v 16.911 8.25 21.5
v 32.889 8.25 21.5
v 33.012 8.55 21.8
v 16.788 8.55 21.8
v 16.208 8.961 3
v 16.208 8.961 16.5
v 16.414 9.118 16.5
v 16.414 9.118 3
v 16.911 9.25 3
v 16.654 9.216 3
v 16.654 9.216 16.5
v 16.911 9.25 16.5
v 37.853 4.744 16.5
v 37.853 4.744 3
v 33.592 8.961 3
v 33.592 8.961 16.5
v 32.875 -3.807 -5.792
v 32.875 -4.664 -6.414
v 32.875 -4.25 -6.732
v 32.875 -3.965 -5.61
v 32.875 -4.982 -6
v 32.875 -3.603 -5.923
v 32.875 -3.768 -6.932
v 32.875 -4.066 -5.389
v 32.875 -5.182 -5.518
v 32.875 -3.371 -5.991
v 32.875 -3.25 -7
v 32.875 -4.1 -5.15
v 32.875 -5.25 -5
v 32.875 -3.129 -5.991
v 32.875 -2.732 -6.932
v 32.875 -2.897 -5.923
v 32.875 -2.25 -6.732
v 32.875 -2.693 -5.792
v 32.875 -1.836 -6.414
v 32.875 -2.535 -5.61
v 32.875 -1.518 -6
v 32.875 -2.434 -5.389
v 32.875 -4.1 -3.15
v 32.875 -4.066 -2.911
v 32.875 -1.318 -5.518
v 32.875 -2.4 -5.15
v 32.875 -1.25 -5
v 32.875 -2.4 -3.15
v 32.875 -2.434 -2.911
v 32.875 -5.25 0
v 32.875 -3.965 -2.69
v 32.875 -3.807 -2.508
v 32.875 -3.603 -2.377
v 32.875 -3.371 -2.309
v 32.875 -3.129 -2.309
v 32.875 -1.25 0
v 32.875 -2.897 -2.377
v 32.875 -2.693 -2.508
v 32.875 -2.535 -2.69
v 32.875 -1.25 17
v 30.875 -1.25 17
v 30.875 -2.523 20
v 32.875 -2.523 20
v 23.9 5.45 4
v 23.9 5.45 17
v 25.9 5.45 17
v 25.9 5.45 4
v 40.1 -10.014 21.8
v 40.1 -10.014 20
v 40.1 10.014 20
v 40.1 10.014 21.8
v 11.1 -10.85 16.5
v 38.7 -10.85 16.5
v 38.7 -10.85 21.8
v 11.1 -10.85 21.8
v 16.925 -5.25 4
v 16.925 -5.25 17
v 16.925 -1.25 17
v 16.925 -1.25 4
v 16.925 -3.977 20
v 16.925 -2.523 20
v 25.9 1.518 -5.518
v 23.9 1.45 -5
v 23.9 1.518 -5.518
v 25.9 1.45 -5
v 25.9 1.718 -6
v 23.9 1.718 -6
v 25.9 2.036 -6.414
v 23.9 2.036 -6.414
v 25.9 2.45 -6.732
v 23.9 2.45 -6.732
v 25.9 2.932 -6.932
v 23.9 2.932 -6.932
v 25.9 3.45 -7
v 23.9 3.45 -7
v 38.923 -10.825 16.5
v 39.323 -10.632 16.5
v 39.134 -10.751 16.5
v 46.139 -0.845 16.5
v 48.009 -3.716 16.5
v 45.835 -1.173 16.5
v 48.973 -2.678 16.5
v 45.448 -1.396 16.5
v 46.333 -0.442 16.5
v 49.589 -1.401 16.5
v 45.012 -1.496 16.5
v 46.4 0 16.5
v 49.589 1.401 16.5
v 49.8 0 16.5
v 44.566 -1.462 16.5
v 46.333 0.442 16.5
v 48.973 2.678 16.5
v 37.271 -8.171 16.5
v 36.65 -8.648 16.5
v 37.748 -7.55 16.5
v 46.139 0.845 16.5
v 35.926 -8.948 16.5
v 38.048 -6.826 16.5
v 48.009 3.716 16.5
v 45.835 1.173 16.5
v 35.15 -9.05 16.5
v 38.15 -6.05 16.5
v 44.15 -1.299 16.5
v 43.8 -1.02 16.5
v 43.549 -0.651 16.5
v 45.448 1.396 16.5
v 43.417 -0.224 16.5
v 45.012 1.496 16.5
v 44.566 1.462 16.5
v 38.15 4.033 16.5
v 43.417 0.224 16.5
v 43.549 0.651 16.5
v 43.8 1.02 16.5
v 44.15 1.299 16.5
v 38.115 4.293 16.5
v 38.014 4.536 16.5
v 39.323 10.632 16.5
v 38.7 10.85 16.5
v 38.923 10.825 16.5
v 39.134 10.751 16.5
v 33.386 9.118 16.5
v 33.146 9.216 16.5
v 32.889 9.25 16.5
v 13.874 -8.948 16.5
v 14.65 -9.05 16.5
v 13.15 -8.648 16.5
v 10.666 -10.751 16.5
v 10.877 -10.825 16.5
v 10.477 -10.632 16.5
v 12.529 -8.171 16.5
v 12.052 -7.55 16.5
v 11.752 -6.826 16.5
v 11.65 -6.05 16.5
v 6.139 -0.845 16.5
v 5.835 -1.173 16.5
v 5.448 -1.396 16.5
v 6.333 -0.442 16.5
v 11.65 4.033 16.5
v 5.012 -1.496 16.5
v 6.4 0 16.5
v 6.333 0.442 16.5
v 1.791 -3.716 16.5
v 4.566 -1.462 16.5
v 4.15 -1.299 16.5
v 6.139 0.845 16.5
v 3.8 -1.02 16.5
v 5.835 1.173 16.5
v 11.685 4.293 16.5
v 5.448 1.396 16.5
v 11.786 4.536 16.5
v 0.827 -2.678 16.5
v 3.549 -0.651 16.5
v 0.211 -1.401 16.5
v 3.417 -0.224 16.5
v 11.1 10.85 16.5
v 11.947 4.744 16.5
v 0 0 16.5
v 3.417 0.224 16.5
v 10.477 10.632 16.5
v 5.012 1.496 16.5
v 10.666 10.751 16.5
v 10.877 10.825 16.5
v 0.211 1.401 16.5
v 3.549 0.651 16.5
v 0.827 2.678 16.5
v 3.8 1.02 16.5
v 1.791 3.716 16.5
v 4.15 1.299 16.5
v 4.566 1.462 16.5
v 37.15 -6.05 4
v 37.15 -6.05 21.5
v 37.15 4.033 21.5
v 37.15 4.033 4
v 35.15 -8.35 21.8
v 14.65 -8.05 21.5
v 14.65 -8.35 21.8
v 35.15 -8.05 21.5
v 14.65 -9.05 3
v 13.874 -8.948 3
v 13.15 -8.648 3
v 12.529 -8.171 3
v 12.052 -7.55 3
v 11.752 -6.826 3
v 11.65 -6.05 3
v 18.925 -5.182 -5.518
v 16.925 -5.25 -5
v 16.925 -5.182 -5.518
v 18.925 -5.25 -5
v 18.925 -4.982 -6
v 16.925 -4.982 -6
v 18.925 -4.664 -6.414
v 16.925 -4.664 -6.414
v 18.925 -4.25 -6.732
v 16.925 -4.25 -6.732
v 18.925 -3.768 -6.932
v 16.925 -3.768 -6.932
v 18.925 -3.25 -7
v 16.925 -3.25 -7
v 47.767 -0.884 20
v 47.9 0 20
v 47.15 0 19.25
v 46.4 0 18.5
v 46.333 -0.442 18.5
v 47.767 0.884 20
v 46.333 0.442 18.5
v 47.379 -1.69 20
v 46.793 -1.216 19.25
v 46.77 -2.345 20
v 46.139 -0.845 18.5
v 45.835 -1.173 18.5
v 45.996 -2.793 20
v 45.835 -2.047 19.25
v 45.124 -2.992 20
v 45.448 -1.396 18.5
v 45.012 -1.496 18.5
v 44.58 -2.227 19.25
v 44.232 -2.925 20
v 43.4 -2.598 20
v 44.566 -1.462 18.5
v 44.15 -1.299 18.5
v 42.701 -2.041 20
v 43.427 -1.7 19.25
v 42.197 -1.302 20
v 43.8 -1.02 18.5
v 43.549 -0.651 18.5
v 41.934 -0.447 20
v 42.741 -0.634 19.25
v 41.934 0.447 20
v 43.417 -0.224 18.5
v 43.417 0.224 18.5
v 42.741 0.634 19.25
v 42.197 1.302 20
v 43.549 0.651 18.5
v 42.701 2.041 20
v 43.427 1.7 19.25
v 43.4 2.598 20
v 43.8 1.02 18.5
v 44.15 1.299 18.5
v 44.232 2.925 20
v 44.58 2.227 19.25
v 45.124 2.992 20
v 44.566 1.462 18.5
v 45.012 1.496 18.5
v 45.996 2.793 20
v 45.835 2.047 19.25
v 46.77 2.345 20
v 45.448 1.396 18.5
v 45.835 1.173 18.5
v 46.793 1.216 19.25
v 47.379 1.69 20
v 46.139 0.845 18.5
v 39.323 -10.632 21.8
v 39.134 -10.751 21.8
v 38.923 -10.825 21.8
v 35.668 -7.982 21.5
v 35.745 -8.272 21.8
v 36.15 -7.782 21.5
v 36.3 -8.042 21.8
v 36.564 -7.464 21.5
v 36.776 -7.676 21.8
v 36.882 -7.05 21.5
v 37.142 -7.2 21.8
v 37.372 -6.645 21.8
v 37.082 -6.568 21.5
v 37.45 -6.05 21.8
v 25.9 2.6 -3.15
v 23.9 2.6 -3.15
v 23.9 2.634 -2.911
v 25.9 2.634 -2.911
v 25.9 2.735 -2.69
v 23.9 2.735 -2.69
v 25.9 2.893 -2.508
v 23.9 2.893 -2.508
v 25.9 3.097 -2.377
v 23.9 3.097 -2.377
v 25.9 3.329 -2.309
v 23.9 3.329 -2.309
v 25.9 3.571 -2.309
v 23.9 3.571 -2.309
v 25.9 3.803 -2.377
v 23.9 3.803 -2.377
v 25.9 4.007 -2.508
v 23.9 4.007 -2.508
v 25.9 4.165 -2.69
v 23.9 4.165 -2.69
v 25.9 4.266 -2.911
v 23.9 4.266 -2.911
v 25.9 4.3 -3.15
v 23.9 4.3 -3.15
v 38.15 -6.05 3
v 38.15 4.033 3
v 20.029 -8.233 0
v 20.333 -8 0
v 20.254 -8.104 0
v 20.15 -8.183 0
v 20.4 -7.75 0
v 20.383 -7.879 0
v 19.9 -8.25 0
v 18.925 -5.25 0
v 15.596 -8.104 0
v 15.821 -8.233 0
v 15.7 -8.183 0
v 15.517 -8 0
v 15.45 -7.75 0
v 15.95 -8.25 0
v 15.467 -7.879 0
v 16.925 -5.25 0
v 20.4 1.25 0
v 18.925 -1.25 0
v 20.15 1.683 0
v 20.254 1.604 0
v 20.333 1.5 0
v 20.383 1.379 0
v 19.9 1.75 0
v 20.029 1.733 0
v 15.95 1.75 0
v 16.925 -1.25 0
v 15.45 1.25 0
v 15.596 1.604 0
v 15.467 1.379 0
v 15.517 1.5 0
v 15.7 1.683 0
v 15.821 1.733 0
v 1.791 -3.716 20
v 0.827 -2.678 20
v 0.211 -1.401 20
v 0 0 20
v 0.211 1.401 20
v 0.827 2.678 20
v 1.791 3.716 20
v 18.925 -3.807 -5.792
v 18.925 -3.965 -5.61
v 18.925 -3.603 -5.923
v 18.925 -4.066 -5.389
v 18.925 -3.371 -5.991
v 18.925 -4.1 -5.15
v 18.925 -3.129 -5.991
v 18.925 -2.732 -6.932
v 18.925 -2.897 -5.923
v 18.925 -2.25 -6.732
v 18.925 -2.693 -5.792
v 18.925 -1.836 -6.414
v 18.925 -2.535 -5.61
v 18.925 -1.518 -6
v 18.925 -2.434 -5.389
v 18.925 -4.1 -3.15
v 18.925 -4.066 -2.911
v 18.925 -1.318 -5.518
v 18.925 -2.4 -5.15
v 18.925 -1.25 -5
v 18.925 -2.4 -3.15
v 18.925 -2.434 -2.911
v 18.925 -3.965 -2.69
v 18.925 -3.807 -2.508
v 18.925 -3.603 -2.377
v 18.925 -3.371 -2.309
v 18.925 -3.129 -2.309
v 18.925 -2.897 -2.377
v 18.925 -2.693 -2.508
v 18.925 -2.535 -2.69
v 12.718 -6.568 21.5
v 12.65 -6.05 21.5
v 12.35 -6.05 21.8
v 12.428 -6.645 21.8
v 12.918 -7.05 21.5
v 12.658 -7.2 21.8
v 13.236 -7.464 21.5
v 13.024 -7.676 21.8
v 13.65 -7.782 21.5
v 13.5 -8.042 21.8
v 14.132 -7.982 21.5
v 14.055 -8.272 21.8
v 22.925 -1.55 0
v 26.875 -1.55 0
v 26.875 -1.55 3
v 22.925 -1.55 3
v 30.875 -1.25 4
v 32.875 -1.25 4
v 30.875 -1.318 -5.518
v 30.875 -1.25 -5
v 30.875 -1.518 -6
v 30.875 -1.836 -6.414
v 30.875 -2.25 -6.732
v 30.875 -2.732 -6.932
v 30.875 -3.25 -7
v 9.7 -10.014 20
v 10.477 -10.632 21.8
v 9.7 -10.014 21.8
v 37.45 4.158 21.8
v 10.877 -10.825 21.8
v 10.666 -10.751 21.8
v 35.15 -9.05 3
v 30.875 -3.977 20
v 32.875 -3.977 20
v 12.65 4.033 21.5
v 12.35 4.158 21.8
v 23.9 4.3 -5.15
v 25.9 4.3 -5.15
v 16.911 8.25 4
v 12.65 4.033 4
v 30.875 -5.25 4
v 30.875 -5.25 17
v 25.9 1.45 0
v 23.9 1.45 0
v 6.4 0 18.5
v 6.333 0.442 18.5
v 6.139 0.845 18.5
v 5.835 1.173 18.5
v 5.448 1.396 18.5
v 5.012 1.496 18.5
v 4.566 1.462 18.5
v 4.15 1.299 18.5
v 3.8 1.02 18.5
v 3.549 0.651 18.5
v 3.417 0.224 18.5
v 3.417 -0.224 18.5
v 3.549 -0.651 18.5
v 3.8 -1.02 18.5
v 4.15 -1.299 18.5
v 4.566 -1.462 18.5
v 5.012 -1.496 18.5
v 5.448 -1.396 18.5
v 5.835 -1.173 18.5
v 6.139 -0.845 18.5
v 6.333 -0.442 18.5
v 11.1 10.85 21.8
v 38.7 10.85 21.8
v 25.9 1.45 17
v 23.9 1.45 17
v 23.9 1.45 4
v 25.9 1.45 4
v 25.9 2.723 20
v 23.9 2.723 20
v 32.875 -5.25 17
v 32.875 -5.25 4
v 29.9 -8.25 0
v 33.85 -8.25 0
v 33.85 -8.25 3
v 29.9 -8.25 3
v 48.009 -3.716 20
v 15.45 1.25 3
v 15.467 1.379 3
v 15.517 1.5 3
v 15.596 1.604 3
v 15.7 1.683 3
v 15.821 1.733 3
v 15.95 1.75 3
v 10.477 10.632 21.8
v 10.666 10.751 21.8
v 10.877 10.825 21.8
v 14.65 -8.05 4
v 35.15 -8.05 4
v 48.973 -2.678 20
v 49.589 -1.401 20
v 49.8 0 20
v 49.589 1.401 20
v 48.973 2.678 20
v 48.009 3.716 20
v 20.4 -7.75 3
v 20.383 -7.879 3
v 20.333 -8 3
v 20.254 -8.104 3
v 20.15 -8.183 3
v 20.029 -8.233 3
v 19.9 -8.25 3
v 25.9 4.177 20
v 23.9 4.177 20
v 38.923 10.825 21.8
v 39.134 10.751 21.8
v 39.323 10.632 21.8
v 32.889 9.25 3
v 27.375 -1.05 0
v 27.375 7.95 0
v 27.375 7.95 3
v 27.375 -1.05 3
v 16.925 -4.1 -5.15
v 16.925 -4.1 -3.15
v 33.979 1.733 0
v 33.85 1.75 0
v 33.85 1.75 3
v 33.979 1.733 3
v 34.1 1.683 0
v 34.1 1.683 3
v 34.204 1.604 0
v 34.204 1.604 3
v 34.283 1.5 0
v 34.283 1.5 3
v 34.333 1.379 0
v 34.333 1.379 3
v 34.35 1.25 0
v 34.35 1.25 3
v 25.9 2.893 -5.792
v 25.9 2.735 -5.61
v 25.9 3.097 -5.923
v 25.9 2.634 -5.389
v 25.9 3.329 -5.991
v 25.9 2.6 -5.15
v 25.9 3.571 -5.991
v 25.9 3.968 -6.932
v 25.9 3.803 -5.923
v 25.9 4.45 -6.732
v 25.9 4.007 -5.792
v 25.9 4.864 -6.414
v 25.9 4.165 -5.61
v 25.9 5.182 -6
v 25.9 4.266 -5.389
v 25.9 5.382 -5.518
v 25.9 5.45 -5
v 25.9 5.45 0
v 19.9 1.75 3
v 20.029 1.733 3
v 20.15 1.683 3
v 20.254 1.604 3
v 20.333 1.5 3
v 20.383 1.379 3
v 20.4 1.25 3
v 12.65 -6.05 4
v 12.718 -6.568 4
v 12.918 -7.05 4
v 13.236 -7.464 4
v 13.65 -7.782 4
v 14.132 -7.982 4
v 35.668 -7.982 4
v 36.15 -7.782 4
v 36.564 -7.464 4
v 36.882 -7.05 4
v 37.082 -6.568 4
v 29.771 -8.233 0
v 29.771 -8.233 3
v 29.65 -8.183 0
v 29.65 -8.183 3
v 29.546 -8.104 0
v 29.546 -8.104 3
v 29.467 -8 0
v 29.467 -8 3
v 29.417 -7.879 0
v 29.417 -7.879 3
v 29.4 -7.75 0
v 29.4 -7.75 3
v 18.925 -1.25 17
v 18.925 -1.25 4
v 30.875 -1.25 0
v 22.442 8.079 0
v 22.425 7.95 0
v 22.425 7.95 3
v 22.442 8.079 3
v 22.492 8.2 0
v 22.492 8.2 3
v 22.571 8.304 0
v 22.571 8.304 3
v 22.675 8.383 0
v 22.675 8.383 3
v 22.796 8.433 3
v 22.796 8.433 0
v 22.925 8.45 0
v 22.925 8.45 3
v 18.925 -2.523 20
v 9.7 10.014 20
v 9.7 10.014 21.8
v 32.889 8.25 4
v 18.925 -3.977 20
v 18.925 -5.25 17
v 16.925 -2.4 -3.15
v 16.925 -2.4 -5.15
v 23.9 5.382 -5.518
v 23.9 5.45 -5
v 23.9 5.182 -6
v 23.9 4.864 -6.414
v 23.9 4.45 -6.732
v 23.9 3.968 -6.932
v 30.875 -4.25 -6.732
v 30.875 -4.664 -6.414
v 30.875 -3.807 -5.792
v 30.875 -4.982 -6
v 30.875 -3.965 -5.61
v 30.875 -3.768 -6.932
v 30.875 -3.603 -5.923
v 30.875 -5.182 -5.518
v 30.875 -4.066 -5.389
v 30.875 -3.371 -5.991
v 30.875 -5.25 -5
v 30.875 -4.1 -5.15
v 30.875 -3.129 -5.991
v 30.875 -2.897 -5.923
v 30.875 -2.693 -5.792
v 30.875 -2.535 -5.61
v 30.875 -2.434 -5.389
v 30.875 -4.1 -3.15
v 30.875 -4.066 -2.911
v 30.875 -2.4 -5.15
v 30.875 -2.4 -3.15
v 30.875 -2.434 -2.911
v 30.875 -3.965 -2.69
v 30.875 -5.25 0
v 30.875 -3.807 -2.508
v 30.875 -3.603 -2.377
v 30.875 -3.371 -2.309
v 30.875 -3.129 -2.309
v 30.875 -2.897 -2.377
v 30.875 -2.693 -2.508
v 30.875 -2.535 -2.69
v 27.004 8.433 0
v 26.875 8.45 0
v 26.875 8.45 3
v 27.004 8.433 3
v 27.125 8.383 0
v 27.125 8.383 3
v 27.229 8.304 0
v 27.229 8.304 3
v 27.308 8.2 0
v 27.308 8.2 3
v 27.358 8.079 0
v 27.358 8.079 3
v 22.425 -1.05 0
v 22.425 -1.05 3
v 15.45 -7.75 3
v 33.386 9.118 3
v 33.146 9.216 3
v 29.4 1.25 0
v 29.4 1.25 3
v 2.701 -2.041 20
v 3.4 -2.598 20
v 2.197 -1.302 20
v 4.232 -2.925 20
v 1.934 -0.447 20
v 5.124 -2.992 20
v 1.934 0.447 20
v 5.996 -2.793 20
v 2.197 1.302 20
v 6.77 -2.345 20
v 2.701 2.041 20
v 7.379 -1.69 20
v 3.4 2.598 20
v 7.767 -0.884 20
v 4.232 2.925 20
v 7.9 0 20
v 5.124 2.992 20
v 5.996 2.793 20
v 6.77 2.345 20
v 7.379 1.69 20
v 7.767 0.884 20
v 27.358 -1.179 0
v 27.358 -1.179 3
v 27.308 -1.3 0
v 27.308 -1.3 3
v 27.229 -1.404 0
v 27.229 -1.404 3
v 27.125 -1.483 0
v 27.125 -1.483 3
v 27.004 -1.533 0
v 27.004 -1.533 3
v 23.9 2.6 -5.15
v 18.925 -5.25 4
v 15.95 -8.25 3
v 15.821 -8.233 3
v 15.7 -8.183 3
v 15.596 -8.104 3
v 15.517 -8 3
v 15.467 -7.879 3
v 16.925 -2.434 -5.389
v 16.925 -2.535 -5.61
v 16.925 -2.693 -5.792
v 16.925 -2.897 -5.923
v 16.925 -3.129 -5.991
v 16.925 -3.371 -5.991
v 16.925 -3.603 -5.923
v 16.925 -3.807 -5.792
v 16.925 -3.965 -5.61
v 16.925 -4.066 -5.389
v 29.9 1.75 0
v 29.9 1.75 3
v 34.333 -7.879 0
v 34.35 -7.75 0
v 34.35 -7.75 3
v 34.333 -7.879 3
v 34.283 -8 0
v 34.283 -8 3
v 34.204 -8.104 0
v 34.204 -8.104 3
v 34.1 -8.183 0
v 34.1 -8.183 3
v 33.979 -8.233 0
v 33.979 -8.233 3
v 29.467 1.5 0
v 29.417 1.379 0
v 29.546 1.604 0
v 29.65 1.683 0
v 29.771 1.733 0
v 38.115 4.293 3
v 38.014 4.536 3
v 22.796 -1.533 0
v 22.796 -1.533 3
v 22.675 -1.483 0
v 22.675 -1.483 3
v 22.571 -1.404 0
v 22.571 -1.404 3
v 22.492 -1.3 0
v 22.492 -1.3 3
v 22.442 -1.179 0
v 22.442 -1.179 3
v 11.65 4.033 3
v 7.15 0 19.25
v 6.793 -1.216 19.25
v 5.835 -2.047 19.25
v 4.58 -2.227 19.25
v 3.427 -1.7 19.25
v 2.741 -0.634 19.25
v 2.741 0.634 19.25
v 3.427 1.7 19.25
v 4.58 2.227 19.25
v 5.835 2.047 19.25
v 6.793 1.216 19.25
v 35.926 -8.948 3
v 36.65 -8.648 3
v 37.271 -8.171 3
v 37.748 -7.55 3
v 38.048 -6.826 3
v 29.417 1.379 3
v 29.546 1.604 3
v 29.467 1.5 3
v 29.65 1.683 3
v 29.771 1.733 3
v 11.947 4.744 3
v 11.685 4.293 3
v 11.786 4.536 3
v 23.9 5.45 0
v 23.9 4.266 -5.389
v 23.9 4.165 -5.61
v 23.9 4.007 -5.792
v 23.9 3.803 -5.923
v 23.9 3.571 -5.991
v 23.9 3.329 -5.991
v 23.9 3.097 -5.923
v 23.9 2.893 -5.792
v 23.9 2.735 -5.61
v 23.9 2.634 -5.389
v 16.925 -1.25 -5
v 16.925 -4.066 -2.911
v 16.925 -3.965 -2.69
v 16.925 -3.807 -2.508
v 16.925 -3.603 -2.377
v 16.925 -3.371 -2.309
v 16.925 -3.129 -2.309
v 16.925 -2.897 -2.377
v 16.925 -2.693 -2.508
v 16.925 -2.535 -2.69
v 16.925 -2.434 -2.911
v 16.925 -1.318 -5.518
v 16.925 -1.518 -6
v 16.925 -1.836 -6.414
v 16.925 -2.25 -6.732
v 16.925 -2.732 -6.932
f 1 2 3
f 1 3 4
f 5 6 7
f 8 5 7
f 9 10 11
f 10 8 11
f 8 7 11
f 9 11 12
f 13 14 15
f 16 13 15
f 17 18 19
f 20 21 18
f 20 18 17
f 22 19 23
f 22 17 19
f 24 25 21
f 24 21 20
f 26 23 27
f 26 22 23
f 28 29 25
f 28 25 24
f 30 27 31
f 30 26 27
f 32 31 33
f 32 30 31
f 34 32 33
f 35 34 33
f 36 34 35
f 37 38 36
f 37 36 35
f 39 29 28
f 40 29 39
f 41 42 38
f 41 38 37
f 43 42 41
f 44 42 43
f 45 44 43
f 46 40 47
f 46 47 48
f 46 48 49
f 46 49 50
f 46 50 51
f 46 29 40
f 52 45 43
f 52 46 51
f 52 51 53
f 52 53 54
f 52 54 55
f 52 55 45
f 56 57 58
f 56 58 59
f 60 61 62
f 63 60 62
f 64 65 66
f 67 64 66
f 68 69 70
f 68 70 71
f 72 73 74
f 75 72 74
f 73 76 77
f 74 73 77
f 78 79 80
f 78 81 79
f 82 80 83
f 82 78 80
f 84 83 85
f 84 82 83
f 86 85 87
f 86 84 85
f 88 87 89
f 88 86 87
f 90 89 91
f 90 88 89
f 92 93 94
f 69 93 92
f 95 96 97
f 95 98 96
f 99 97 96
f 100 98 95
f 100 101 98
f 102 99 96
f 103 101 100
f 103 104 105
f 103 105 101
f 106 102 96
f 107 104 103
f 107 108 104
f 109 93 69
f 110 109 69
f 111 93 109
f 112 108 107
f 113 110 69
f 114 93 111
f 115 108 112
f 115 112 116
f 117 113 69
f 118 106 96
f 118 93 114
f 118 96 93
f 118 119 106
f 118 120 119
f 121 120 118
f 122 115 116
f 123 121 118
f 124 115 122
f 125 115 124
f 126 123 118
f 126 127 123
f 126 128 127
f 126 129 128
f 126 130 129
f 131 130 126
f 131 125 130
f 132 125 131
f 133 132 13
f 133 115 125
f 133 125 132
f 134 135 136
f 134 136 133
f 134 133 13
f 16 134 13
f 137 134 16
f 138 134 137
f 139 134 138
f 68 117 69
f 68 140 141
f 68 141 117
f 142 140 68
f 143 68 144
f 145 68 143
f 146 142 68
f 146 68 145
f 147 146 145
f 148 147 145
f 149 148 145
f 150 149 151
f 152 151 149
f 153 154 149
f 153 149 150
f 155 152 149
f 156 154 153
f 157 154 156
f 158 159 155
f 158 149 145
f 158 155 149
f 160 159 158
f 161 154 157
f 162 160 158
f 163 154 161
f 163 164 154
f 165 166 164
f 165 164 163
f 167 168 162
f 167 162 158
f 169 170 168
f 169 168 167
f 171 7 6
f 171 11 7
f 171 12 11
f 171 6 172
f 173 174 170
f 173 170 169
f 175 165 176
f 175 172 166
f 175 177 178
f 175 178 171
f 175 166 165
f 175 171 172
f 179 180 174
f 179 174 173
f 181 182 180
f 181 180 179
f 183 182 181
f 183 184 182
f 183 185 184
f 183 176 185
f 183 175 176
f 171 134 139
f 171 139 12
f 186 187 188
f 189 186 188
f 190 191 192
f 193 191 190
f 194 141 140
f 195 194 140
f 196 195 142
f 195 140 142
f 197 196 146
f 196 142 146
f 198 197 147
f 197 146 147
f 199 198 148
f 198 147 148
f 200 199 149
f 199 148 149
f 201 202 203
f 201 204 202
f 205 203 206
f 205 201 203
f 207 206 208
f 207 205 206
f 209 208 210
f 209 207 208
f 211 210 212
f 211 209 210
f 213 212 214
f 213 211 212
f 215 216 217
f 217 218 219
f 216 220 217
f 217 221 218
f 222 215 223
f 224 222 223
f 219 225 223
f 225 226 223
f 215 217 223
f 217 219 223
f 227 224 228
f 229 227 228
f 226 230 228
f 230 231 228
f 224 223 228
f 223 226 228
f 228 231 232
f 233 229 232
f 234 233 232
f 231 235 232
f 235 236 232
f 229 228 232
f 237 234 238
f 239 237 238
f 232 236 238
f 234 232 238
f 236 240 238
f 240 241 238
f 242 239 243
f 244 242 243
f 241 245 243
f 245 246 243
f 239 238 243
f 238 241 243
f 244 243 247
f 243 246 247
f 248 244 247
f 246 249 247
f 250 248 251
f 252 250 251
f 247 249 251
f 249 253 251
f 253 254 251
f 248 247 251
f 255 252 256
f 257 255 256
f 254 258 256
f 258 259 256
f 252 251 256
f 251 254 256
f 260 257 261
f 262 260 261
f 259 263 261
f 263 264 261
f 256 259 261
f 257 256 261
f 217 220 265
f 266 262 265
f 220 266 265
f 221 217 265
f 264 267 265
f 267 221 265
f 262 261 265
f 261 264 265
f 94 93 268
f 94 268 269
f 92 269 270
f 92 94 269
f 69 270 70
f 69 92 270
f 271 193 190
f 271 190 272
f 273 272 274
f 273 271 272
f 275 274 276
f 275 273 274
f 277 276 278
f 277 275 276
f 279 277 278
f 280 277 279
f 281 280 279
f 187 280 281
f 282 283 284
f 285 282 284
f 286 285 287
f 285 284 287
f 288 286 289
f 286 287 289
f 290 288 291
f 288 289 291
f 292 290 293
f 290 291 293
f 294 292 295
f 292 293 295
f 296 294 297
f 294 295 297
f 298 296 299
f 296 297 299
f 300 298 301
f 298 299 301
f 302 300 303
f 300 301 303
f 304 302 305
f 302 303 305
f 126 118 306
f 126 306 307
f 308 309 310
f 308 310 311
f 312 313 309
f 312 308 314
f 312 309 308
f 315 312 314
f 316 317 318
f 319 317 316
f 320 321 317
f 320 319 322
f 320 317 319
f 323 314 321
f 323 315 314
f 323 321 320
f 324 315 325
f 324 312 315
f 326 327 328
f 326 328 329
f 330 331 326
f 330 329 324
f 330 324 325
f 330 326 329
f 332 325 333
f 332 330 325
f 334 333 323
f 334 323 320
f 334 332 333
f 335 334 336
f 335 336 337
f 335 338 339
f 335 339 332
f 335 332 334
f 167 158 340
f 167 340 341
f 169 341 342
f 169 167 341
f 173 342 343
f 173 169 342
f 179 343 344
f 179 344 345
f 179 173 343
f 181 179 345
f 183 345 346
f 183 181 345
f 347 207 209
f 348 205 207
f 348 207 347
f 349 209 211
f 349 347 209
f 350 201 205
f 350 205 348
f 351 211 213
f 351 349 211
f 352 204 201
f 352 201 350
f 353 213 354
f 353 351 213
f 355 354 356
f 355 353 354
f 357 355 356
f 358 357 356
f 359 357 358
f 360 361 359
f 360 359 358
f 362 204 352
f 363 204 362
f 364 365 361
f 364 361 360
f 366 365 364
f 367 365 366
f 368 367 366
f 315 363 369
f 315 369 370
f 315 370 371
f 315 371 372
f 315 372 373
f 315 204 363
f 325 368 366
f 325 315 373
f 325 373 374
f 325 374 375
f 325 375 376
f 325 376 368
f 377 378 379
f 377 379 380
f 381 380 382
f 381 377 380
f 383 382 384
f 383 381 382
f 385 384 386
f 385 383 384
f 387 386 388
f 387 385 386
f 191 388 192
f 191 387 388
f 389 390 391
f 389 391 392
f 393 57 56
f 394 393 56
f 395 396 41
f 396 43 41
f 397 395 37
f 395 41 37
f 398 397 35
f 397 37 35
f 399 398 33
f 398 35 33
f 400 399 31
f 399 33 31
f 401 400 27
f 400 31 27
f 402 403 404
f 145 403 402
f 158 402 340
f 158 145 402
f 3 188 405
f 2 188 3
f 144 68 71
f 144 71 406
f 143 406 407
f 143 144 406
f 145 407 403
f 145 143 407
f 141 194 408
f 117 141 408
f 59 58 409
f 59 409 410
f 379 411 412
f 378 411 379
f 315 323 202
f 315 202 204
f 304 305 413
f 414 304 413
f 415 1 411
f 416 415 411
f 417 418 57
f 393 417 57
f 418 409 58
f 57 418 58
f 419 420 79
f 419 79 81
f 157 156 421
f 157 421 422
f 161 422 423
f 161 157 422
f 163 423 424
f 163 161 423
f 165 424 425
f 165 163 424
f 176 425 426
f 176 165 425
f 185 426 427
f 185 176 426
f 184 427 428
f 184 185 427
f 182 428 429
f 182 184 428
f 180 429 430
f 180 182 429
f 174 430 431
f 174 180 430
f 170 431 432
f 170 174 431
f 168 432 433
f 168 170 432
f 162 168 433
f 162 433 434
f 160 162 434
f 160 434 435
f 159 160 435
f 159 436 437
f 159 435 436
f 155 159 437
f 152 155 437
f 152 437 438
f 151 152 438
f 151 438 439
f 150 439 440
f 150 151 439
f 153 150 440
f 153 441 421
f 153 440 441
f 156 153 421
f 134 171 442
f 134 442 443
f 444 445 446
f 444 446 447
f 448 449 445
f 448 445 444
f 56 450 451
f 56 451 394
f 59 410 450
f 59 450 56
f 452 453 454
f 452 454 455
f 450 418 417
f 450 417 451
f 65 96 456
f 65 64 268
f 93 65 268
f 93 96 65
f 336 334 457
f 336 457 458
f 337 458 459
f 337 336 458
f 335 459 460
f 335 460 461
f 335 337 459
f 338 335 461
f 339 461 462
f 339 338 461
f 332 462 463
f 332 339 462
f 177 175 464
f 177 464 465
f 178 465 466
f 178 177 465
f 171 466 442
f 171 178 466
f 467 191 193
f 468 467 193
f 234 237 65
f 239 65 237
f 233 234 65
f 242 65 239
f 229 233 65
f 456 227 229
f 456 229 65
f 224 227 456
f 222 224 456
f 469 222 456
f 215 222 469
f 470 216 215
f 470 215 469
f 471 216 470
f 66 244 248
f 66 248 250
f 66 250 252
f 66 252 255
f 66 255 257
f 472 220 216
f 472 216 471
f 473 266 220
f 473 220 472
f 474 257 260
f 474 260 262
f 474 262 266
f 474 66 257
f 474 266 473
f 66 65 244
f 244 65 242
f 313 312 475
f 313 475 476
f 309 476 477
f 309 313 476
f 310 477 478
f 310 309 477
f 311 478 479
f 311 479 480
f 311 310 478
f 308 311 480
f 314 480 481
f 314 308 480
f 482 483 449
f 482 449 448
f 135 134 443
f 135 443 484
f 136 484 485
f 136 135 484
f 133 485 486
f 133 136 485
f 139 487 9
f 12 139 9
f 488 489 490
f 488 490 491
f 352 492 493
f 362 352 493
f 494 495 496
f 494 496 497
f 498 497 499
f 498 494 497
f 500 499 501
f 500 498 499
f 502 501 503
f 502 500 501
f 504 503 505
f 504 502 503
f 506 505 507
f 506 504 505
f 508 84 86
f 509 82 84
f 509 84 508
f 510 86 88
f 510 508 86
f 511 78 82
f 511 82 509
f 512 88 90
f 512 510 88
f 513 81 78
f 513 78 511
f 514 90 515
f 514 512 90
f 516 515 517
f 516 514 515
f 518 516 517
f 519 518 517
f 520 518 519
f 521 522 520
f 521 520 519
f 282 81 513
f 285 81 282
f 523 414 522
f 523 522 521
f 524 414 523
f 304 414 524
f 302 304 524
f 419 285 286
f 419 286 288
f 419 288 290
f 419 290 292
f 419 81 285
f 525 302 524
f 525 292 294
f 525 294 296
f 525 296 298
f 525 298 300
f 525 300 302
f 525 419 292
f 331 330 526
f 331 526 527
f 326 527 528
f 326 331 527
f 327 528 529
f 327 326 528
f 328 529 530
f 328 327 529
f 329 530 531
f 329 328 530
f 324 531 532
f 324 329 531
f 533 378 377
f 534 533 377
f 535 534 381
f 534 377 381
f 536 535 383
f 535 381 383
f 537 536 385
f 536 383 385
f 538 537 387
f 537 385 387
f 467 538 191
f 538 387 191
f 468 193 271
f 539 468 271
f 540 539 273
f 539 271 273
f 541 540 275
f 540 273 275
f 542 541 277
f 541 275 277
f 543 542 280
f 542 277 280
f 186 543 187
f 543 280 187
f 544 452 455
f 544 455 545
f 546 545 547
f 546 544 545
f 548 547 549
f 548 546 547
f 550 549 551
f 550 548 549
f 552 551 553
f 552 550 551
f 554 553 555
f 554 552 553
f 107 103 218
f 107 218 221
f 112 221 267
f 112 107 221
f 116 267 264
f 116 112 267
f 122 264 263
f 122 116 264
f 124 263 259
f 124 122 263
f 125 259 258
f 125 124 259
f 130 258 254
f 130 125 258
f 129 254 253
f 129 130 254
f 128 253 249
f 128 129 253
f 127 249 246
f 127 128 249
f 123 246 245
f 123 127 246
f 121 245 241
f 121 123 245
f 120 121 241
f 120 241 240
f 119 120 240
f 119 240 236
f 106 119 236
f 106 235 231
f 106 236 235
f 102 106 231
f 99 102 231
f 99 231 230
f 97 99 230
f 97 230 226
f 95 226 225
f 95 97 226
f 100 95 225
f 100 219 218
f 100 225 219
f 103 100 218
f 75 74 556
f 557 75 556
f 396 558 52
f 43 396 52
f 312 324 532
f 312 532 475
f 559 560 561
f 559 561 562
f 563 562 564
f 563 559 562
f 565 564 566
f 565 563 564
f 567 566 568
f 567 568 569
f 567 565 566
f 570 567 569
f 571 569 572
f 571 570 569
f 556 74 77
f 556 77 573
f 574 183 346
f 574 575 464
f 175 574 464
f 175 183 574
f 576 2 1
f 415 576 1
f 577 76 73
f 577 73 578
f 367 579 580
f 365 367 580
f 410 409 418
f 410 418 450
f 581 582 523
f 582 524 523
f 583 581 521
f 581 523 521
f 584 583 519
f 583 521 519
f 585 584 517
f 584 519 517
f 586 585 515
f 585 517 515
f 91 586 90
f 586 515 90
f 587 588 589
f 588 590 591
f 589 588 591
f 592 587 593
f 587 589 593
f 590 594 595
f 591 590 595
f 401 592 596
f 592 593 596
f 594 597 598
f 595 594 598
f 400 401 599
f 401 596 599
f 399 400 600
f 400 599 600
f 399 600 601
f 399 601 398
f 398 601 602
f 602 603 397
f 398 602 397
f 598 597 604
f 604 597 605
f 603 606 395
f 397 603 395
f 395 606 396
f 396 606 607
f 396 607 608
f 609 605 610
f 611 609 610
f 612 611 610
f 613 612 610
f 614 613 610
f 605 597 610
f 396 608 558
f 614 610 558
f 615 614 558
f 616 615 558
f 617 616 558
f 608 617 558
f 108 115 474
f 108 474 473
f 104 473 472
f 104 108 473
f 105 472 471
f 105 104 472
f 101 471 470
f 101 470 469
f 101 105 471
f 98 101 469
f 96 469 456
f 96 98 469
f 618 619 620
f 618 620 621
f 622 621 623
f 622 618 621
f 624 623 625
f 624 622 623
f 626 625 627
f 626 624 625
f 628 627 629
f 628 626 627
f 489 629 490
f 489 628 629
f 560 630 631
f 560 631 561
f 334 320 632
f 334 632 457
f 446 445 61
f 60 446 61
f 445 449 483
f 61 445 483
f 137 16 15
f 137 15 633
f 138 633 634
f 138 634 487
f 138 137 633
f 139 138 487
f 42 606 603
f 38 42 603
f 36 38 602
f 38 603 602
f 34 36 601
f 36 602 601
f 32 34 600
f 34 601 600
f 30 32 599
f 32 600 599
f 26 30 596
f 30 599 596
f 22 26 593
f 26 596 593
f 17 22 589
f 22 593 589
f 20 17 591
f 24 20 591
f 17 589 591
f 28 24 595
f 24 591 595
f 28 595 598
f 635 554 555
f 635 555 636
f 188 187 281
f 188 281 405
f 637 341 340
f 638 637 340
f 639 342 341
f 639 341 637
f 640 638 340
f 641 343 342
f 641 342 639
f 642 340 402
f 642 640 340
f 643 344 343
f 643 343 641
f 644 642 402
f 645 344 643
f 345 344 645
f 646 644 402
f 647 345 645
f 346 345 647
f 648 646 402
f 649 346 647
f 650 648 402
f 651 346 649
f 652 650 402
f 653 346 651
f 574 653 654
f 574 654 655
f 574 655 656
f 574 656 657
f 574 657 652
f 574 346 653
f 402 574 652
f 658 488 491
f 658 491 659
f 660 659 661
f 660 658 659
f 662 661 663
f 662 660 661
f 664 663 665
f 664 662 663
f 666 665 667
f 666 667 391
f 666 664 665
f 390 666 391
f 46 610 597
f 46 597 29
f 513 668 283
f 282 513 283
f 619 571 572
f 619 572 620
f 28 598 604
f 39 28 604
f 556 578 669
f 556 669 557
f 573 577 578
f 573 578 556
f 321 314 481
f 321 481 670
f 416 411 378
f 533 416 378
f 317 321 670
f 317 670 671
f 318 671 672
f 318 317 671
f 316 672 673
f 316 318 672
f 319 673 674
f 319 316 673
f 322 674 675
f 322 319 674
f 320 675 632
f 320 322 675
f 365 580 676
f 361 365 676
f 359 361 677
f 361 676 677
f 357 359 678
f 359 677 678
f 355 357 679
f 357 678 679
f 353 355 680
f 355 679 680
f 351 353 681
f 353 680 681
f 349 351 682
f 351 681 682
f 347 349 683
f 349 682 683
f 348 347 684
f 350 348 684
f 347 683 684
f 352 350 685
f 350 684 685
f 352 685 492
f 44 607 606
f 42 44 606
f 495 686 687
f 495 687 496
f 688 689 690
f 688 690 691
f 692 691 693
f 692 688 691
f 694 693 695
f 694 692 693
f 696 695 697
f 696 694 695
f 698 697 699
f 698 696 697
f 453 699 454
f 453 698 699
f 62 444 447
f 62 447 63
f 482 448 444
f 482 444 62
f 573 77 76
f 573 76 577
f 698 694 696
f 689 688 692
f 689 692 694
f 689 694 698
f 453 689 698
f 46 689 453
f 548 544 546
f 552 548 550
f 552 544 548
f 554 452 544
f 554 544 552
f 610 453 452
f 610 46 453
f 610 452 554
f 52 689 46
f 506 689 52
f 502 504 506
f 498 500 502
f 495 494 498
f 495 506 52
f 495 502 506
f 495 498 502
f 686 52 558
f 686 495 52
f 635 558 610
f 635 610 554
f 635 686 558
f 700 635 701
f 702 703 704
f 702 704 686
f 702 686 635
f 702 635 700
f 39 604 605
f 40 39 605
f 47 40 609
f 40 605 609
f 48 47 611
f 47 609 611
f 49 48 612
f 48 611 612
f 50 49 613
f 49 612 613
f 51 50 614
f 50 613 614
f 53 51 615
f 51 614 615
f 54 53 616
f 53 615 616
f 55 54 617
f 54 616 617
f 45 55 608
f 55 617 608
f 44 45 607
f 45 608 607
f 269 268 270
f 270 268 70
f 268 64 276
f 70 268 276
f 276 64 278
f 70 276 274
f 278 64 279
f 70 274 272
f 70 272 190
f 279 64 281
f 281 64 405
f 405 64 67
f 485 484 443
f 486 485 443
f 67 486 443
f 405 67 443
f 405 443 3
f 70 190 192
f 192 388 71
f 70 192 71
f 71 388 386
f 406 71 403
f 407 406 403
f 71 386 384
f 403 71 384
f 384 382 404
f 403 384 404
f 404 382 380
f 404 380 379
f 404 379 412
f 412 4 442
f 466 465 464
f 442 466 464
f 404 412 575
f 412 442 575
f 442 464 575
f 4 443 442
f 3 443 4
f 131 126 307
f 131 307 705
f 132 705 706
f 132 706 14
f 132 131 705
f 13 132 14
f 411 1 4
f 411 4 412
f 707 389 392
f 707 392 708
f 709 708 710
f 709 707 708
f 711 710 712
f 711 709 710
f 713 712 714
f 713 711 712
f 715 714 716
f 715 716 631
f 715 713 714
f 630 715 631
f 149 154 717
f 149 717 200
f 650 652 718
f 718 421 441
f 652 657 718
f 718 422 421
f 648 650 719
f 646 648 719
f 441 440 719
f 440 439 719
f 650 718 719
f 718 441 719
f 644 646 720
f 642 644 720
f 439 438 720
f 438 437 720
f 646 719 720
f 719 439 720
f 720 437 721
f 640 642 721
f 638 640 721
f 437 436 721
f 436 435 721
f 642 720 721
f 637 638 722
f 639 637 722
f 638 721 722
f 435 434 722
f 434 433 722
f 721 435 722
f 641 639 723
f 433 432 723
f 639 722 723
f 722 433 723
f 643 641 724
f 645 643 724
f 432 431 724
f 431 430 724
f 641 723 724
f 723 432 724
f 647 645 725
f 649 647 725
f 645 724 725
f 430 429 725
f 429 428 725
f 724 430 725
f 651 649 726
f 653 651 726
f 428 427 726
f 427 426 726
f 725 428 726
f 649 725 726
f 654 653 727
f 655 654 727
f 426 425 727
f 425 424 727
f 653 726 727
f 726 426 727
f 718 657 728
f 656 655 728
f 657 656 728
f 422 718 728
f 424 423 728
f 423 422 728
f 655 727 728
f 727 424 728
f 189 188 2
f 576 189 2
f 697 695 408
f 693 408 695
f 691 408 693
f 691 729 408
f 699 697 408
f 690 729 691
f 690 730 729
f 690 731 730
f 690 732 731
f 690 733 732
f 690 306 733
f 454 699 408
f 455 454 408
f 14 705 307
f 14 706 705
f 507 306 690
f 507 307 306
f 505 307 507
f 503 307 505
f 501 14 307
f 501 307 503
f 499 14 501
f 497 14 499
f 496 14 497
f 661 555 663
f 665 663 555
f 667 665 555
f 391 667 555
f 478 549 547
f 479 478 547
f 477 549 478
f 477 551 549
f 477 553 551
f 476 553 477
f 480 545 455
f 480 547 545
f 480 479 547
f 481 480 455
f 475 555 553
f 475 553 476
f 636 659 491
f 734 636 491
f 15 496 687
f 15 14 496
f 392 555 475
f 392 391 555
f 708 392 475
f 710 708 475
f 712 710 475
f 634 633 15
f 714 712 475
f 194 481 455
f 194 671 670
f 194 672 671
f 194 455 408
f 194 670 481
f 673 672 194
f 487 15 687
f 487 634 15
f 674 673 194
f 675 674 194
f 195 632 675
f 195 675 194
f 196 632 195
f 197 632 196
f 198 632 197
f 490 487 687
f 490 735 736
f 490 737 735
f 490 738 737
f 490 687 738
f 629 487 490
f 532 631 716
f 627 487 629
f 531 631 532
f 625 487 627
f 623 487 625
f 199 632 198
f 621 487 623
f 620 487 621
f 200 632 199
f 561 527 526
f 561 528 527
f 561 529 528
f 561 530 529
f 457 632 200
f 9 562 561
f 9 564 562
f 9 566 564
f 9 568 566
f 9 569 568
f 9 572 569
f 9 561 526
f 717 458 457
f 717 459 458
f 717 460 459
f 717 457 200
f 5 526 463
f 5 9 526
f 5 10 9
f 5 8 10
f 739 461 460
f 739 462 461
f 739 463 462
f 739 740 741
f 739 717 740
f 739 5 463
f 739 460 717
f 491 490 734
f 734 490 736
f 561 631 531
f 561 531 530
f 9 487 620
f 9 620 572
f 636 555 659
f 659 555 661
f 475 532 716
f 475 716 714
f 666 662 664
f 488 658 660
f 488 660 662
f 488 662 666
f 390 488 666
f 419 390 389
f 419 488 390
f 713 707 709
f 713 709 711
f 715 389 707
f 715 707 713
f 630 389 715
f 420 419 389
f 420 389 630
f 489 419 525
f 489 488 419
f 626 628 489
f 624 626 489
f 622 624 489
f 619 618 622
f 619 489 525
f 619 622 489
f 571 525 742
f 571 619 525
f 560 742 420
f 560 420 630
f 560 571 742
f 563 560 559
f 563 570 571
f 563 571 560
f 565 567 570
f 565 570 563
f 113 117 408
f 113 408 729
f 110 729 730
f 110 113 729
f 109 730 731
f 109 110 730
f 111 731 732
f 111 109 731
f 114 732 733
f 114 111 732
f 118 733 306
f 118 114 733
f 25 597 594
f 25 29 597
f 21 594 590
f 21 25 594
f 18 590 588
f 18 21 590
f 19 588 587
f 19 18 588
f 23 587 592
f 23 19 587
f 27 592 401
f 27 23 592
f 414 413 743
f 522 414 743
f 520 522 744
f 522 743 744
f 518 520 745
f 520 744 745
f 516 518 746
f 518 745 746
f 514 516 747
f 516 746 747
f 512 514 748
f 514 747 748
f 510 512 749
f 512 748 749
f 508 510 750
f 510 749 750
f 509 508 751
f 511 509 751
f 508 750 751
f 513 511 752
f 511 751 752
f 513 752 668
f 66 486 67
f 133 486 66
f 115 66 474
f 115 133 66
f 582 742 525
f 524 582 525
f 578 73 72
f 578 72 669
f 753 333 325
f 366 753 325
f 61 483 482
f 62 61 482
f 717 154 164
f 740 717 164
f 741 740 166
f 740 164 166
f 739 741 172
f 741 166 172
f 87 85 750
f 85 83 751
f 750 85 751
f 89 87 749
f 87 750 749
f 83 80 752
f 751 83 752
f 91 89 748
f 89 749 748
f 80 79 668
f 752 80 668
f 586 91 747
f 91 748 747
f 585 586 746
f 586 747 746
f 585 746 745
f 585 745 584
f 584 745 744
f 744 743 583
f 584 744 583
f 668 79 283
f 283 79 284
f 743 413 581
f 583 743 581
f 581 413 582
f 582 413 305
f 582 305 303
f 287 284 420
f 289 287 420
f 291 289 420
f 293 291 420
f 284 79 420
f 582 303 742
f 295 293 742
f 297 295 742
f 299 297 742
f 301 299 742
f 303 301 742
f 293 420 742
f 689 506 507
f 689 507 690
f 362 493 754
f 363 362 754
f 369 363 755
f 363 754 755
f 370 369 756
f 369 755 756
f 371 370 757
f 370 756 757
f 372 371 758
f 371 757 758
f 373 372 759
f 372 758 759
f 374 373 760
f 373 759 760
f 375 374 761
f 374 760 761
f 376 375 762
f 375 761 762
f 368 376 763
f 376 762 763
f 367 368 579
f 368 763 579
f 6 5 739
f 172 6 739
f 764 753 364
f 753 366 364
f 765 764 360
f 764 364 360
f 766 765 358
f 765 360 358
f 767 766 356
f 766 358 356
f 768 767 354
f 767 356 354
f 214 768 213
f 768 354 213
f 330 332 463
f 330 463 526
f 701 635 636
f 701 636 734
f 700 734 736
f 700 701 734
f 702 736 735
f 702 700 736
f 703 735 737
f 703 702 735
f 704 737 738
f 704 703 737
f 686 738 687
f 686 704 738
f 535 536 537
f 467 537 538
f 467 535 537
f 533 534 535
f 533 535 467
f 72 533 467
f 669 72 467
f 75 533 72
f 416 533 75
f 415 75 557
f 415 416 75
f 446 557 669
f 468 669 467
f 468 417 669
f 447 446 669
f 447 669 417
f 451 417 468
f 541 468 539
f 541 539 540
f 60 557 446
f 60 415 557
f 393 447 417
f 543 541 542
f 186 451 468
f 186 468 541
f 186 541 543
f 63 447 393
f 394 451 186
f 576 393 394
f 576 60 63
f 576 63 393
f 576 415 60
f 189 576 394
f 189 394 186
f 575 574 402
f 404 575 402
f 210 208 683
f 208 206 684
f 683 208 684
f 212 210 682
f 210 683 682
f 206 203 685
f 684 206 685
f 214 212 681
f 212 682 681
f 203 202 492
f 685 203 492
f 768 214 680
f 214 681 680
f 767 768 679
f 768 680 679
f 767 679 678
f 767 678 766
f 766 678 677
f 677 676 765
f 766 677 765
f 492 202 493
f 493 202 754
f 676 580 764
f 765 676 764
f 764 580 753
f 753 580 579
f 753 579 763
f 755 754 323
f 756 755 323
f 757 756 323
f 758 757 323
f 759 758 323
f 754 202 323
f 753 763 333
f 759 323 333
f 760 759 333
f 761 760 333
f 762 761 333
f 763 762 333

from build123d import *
from OCP.BRepFilletAPI import BRepFilletAPI_MakeChamfer

# Parameters (mm, degrees)
SKETCH1_R               = 1.5
BOSS_EXTRUDE1_DEPTH     = 21.8
CUT_EXTRUDE1_START      = -1.8
SKETCH2_W               = 54.830632019
SKETCH2_H               = 32.18582254
CUT_EXTRUDE1_DEPTH      = 1.8
SKETCH3_W               = 57.724078453
SKETCH3_H               = 32.716020725
CUT_EXTRUDE2_DEPTH      = 16.5
FILLET1_R               = 3
FILLET2_R               = 1
CUT_EXTRUDE3_DEPTH      = 17.8
CHAMFER1_SIZE           = 0.3
CHAMFER2_SIZE           = 1.5
SKETCH5_W               = 33.078515986
SKETCH5_H               = 22.592086676
CUT_EXTRUDE4_DEPTH      = 3
SKETCH6_W               = 2
SKETCH6_H               = 4
BOSS_EXTRUDE2_DEPTH     = 27
CHAMFER3_SIZE           = 3
CHAMFER3_SIZE2          = 1.273424449
CUT_EXTRUDE5_DEPTH      = 36.549578057
CUT_EXTRUDE5_DEPTH_BACK = 36.549578057
FILLET3_R               = 2


with BuildPart() as part:
    # Sketch1 → Boss-Extrude1 (new body)
    with BuildSketch(Plane.XY):
        with BuildLine():
            Line((1.791039749, 3.715784471), (10.476580913, 10.632270415))
            ThreePointArc((10.476580913, 10.632270415), (10.769573262, 10.79399958), (11.099519913, 10.85))
            Line((11.099519913, 10.85), (38.700480087, 10.85))
            ThreePointArc((38.700480087, 10.85), (39.030426738, 10.79399958), (39.323419087, 10.632270415))
            Line((39.323419087, 10.632270415), (48.008960251, 3.715784471))
            ThreePointArc((48.008960251, 3.715784471), (49.8, 0), (48.008960251, -3.715784471))
            Line((48.008960251, -3.715784471), (39.323419087, -10.632270415))
            ThreePointArc((39.323419087, -10.632270415), (39.030426738, -10.79399958), (38.700480087, -10.85))
            Line((38.700480087, -10.85), (11.099519913, -10.85))
            ThreePointArc((11.099519913, -10.85), (10.769573262, -10.79399958), (10.476580913, -10.632270415))
            Line((10.476580913, -10.632270415), (1.791039749, -3.715784471))
            ThreePointArc((1.791039749, -3.715784471), (0, 0), (1.791039749, 3.715784471))
        make_face()
        with Locations((4.9, 0)):
            Circle(SKETCH1_R, mode=Mode.SUBTRACT)
        with Locations((44.9, 0)):
            Circle(SKETCH1_R, mode=Mode.SUBTRACT)
    extrude(amount=BOSS_EXTRUDE1_DEPTH)

    # Sketch2 → Cut-Extrude1 (cut)
    with BuildSketch(Plane.XY.offset(21.8).offset(CUT_EXTRUDE1_START)):
        with Locations((23.298408534, -3.305326345)):
            Rectangle(SKETCH2_W, SKETCH2_H)
        with BuildLine():
            Line((11.099519913, -10.85), (38.700480087, -10.85))
            ThreePointArc((38.700480087, -10.85), (39.030426738, -10.79399958), (39.323419087, -10.632270415))
            Line((39.323419087, -10.632270415), (40.1, -10.013862089))
            Line((40.1, -10.013862089), (40.1, 10.013862089))
            Line((40.1, 10.013862089), (39.323419087, 10.632270415))
            ThreePointArc((39.323419087, 10.632270415), (39.030426738, 10.79399958), (38.700480087, 10.85))
            Line((38.700480087, 10.85), (11.099519913, 10.85))
            ThreePointArc((11.099519913, 10.85), (10.769573262, 10.79399958), (10.476580913, 10.632270415))
            Line((10.476580913, 10.632270415), (9.7, 10.013862089))
            Line((9.7, 10.013862089), (9.7, -10.013862089))
            Line((9.7, -10.013862089), (10.476580913, -10.632270415))
            ThreePointArc((10.476580913, -10.632270415), (10.769573262, -10.79399958), (11.099519913, -10.85))
        make_face(mode=Mode.SUBTRACT)
    extrude(amount=CUT_EXTRUDE1_DEPTH, mode=Mode.SUBTRACT)

    # Sketch3 → Cut-Extrude2 (cut)
    with BuildSketch(Plane(origin=(0, 0, 0), x_dir=(-1, 0, 0), z_dir=(0, 0, -1))):
        with Locations((-24.814355967, -1.741428677)):
            Rectangle(SKETCH3_W, SKETCH3_H)
        Polygon((-38.15, -9.05), (-38.15, 4.45), (-33.3, 9.25), (-16.5, 9.25), (-11.65, 4.45), (-11.65, -9.05), align=None, mode=Mode.SUBTRACT)
    extrude(amount=-CUT_EXTRUDE2_DEPTH, mode=Mode.SUBTRACT)

    # Fillet1
    fillet1_edges = [part.edges().sort_by_distance(p)[0] for p in [
        (38.15, -9.05, 8.25),
        (11.65, -9.05, 8.25),
    ]]
    fillet(fillet1_edges, radius=FILLET1_R)

    # Fillet2
    fillet2_edges = [part.edges().sort_by_distance(p)[0] for p in [
        (38.15, 4.45, 8.25),
        (33.3, 9.25, 8.25),
        (16.5, 9.25, 8.25),
        (11.65, 4.45, 8.25),
    ]]
    fillet(fillet2_edges, radius=FILLET2_R)

    # Sketch4 → Cut-Extrude3 (cut)
    with BuildSketch(Plane.XY.offset(21.8)):
        with BuildLine():
            Line((37.15, 4.032748035), (32.888818327, 8.25))
            Line((32.888818327, 8.25), (16.911181673, 8.25))
            Line((16.911181673, 8.25), (12.65, 4.032748035))
            Line((12.65, 4.032748035), (12.65, -6.05))
            ThreePointArc((12.65, -6.05), (13.235786438, -7.464213562), (14.65, -8.05))
            Line((14.65, -8.05), (35.15, -8.05))
            ThreePointArc((35.15, -8.05), (36.564213562, -7.464213562), (37.15, -6.05))
            Line((37.15, -6.05), (37.15, 4.032748035))
        make_face()
    extrude(amount=-CUT_EXTRUDE3_DEPTH, mode=Mode.SUBTRACT)

    # Chamfer1
    chamfer1_edges = [part.edges().sort_by_distance(p)[0] for p in [
        (37.15, -1.008625983, 21.8),
        (35.019409163, 6.141374017, 21.8),
        (24.9, 8.25, 21.8),
        (14.780590837, 6.141374017, 21.8),
        (12.65, -1.008625983, 21.8),
        (13.235786438, -7.464213562, 21.8),
        (24.9, -8.05, 21.8),
        (36.564213562, -7.464213562, 21.8),
    ]]
    chamfer(chamfer1_edges, length=CHAMFER1_SIZE)

    # Chamfer2
    chamfer2_edges = [part.edges().sort_by_distance(p)[0] for p in [
        (3.4, 0, 20),
        (43.4, 0, 20),
    ]]
    chamfer(chamfer2_edges, length=CHAMFER2_SIZE)

    # Sketch5 → Cut-Extrude4 (cut)
    with BuildSketch(Plane(origin=(0, 0, 0), x_dir=(-1, 0, 0), z_dir=(0, 0, -1))):
        with Locations((-24.236330555, -0.057007702)):
            Rectangle(SKETCH5_W, SKETCH5_H)
        with BuildLine():
            Line((-26.875, -1.55), (-22.925, -1.55))
            ThreePointArc((-22.925, -1.55), (-22.571446609, -1.403553391), (-22.425, -1.05))
            Line((-22.425, -1.05), (-22.425, 7.95))
            ThreePointArc((-22.425, 7.95), (-22.571446609, 8.303553391), (-22.925, 8.45))
            Line((-22.925, 8.45), (-26.875, 8.45))
            ThreePointArc((-26.875, 8.45), (-27.228553391, 8.303553391), (-27.375, 7.95))
            Line((-27.375, 7.95), (-27.375, -1.05))
            ThreePointArc((-27.375, -1.05), (-27.228553391, -1.403553391), (-26.875, -1.55))
        make_face(mode=Mode.SUBTRACT)
        with BuildLine():
            Line((-19.9, -8.25), (-15.95, -8.25))
            ThreePointArc((-15.95, -8.25), (-15.596446609, -8.103553391), (-15.45, -7.75))
            Line((-15.45, -7.75), (-15.45, 1.25))
            ThreePointArc((-15.45, 1.25), (-15.596446609, 1.603553391), (-15.95, 1.75))
            Line((-15.95, 1.75), (-19.9, 1.75))
            ThreePointArc((-19.9, 1.75), (-20.253553391, 1.603553391), (-20.4, 1.25))
            Line((-20.4, 1.25), (-20.4, -7.75))
            ThreePointArc((-20.4, -7.75), (-20.253553391, -8.103553391), (-19.9, -8.25))
        make_face(mode=Mode.SUBTRACT)
        with BuildLine():
            Line((-33.85, -8.25), (-29.9, -8.25))
            ThreePointArc((-29.9, -8.25), (-29.546446609, -8.103553391), (-29.4, -7.75))
            Line((-29.4, -7.75), (-29.4, 1.25))
            ThreePointArc((-29.4, 1.25), (-29.546446609, 1.603553391), (-29.9, 1.75))
            Line((-29.9, 1.75), (-33.85, 1.75))
            ThreePointArc((-33.85, 1.75), (-34.203553391, 1.603553391), (-34.35, 1.25))
            Line((-34.35, 1.25), (-34.35, -7.75))
            ThreePointArc((-34.35, -7.75), (-34.203553391, -8.103553391), (-33.85, -8.25))
        make_face(mode=Mode.SUBTRACT)
    extrude(amount=-CUT_EXTRUDE4_DEPTH, mode=Mode.SUBTRACT)

    # Sketch6 → Boss-Extrude2 (add)
    with BuildSketch(Plane.XY.offset(20)):
        with Locations((24.9, 3.45)):
            Rectangle(SKETCH6_W, SKETCH6_H)
        with Locations((17.925, -3.25)):
            Rectangle(SKETCH6_W, SKETCH6_H)
        with Locations((31.875, -3.25)):
            Rectangle(SKETCH6_W, SKETCH6_H)
    extrude(amount=-BOSS_EXTRUDE2_DEPTH)

    # Chamfer3: one chamfer whose edges measure the first distance from different faces: ONE call of the kernel's chamfer builder (chamfer() names one face for all edges)
    chamfer3_edges_1 = [part.edges().sort_by_distance(p)[0] for p in [
        (24.9, 1.45, 20),
    ]]
    chamfer3_side_1 = [part.faces().sort_by_distance(p)[0] for p in [
        (24.9, 1.45, 12),
    ]]
    chamfer3_edges_2 = [part.edges().sort_by_distance(p)[0] for p in [
        (24.9, 5.45, 20),
    ]]
    chamfer3_side_2 = [part.faces().sort_by_distance(p)[0] for p in [
        (24.9, 5.45, 12),
    ]]
    chamfer3_edges_3 = [part.edges().sort_by_distance(p)[0] for p in [
        (17.925, -5.25, 20),
    ]]
    chamfer3_side_3 = [part.faces().sort_by_distance(p)[0] for p in [
        (17.925, -5.25, 12),
    ]]
    chamfer3_edges_4 = [part.edges().sort_by_distance(p)[0] for p in [
        (17.925, -1.25, 20),
    ]]
    chamfer3_side_4 = [part.faces().sort_by_distance(p)[0] for p in [
        (17.925, -1.25, 12),
    ]]
    chamfer3_edges_5 = [part.edges().sort_by_distance(p)[0] for p in [
        (31.875, -5.25, 20),
    ]]
    chamfer3_side_5 = [part.faces().sort_by_distance(p)[0] for p in [
        (31.875, -5.25, 12),
    ]]
    chamfer3_edges_6 = [part.edges().sort_by_distance(p)[0] for p in [
        (31.875, -1.25, 20),
    ]]
    chamfer3_side_6 = [part.faces().sort_by_distance(p)[0] for p in [
        (31.875, -1.25, 12),
    ]]
    chamfer3 = BRepFilletAPI_MakeChamfer(part.part.solid().wrapped)
    for e in chamfer3_edges_1:
        chamfer3.Add(CHAMFER3_SIZE, CHAMFER3_SIZE2, e.wrapped, chamfer3_side_1[0].wrapped)  # the first distance lies on this face
    for e in chamfer3_edges_2:
        chamfer3.Add(CHAMFER3_SIZE, CHAMFER3_SIZE2, e.wrapped, chamfer3_side_2[0].wrapped)  # the first distance lies on this face
    for e in chamfer3_edges_3:
        chamfer3.Add(CHAMFER3_SIZE, CHAMFER3_SIZE2, e.wrapped, chamfer3_side_3[0].wrapped)  # the first distance lies on this face
    for e in chamfer3_edges_4:
        chamfer3.Add(CHAMFER3_SIZE, CHAMFER3_SIZE2, e.wrapped, chamfer3_side_4[0].wrapped)  # the first distance lies on this face
    for e in chamfer3_edges_5:
        chamfer3.Add(CHAMFER3_SIZE, CHAMFER3_SIZE2, e.wrapped, chamfer3_side_5[0].wrapped)  # the first distance lies on this face
    for e in chamfer3_edges_6:
        chamfer3.Add(CHAMFER3_SIZE, CHAMFER3_SIZE2, e.wrapped, chamfer3_side_6[0].wrapped)  # the first distance lies on this face
    add(Compound.cast(chamfer3.Shape()), mode=Mode.REPLACE)

    # Sketch7 → Cut-Extrude5 (cut, two sides: drawn at the far end of the back side and taken through both)
    with BuildSketch(Plane(origin=(25.9, 0, 0), x_dir=(0, 0, -1), z_dir=(1, 0, 0)).offset(-CUT_EXTRUDE5_DEPTH_BACK)):
        with BuildLine():
            Line((3.15, 4.3), (5.15, 4.3))
            ThreePointArc((5.15, 4.3), (6, 3.45), (5.15, 2.6))
            Line((5.15, 2.6), (3.15, 2.6))
            ThreePointArc((3.15, 2.6), (2.3, 3.45), (3.15, 4.3))
        make_face()
        with BuildLine():
            Line((3.15, -2.4), (5.15, -2.4))
            ThreePointArc((5.15, -2.4), (6, -3.25), (5.15, -4.1))
            Line((5.15, -4.1), (3.15, -4.1))
            ThreePointArc((3.15, -4.1), (2.3, -3.25), (3.15, -2.4))
        make_face()
    extrude(amount=CUT_EXTRUDE5_DEPTH + CUT_EXTRUDE5_DEPTH_BACK, mode=Mode.SUBTRACT)

    # Fillet3
    fillet3_edges = [part.edges().sort_by_distance(p)[0] for p in [
        (31.875, -5.25, -7),
        (31.875, -1.25, -7),
        (17.925, -5.25, -7),
        (24.9, 1.45, -7),
        (17.925, -1.25, -7),
        (24.9, 5.45, -7),
    ]]
    fillet(fillet3_edges, radius=FILLET3_R - 0.0001)  # a hair under: the kernel refuses the full size


solid = part.part
